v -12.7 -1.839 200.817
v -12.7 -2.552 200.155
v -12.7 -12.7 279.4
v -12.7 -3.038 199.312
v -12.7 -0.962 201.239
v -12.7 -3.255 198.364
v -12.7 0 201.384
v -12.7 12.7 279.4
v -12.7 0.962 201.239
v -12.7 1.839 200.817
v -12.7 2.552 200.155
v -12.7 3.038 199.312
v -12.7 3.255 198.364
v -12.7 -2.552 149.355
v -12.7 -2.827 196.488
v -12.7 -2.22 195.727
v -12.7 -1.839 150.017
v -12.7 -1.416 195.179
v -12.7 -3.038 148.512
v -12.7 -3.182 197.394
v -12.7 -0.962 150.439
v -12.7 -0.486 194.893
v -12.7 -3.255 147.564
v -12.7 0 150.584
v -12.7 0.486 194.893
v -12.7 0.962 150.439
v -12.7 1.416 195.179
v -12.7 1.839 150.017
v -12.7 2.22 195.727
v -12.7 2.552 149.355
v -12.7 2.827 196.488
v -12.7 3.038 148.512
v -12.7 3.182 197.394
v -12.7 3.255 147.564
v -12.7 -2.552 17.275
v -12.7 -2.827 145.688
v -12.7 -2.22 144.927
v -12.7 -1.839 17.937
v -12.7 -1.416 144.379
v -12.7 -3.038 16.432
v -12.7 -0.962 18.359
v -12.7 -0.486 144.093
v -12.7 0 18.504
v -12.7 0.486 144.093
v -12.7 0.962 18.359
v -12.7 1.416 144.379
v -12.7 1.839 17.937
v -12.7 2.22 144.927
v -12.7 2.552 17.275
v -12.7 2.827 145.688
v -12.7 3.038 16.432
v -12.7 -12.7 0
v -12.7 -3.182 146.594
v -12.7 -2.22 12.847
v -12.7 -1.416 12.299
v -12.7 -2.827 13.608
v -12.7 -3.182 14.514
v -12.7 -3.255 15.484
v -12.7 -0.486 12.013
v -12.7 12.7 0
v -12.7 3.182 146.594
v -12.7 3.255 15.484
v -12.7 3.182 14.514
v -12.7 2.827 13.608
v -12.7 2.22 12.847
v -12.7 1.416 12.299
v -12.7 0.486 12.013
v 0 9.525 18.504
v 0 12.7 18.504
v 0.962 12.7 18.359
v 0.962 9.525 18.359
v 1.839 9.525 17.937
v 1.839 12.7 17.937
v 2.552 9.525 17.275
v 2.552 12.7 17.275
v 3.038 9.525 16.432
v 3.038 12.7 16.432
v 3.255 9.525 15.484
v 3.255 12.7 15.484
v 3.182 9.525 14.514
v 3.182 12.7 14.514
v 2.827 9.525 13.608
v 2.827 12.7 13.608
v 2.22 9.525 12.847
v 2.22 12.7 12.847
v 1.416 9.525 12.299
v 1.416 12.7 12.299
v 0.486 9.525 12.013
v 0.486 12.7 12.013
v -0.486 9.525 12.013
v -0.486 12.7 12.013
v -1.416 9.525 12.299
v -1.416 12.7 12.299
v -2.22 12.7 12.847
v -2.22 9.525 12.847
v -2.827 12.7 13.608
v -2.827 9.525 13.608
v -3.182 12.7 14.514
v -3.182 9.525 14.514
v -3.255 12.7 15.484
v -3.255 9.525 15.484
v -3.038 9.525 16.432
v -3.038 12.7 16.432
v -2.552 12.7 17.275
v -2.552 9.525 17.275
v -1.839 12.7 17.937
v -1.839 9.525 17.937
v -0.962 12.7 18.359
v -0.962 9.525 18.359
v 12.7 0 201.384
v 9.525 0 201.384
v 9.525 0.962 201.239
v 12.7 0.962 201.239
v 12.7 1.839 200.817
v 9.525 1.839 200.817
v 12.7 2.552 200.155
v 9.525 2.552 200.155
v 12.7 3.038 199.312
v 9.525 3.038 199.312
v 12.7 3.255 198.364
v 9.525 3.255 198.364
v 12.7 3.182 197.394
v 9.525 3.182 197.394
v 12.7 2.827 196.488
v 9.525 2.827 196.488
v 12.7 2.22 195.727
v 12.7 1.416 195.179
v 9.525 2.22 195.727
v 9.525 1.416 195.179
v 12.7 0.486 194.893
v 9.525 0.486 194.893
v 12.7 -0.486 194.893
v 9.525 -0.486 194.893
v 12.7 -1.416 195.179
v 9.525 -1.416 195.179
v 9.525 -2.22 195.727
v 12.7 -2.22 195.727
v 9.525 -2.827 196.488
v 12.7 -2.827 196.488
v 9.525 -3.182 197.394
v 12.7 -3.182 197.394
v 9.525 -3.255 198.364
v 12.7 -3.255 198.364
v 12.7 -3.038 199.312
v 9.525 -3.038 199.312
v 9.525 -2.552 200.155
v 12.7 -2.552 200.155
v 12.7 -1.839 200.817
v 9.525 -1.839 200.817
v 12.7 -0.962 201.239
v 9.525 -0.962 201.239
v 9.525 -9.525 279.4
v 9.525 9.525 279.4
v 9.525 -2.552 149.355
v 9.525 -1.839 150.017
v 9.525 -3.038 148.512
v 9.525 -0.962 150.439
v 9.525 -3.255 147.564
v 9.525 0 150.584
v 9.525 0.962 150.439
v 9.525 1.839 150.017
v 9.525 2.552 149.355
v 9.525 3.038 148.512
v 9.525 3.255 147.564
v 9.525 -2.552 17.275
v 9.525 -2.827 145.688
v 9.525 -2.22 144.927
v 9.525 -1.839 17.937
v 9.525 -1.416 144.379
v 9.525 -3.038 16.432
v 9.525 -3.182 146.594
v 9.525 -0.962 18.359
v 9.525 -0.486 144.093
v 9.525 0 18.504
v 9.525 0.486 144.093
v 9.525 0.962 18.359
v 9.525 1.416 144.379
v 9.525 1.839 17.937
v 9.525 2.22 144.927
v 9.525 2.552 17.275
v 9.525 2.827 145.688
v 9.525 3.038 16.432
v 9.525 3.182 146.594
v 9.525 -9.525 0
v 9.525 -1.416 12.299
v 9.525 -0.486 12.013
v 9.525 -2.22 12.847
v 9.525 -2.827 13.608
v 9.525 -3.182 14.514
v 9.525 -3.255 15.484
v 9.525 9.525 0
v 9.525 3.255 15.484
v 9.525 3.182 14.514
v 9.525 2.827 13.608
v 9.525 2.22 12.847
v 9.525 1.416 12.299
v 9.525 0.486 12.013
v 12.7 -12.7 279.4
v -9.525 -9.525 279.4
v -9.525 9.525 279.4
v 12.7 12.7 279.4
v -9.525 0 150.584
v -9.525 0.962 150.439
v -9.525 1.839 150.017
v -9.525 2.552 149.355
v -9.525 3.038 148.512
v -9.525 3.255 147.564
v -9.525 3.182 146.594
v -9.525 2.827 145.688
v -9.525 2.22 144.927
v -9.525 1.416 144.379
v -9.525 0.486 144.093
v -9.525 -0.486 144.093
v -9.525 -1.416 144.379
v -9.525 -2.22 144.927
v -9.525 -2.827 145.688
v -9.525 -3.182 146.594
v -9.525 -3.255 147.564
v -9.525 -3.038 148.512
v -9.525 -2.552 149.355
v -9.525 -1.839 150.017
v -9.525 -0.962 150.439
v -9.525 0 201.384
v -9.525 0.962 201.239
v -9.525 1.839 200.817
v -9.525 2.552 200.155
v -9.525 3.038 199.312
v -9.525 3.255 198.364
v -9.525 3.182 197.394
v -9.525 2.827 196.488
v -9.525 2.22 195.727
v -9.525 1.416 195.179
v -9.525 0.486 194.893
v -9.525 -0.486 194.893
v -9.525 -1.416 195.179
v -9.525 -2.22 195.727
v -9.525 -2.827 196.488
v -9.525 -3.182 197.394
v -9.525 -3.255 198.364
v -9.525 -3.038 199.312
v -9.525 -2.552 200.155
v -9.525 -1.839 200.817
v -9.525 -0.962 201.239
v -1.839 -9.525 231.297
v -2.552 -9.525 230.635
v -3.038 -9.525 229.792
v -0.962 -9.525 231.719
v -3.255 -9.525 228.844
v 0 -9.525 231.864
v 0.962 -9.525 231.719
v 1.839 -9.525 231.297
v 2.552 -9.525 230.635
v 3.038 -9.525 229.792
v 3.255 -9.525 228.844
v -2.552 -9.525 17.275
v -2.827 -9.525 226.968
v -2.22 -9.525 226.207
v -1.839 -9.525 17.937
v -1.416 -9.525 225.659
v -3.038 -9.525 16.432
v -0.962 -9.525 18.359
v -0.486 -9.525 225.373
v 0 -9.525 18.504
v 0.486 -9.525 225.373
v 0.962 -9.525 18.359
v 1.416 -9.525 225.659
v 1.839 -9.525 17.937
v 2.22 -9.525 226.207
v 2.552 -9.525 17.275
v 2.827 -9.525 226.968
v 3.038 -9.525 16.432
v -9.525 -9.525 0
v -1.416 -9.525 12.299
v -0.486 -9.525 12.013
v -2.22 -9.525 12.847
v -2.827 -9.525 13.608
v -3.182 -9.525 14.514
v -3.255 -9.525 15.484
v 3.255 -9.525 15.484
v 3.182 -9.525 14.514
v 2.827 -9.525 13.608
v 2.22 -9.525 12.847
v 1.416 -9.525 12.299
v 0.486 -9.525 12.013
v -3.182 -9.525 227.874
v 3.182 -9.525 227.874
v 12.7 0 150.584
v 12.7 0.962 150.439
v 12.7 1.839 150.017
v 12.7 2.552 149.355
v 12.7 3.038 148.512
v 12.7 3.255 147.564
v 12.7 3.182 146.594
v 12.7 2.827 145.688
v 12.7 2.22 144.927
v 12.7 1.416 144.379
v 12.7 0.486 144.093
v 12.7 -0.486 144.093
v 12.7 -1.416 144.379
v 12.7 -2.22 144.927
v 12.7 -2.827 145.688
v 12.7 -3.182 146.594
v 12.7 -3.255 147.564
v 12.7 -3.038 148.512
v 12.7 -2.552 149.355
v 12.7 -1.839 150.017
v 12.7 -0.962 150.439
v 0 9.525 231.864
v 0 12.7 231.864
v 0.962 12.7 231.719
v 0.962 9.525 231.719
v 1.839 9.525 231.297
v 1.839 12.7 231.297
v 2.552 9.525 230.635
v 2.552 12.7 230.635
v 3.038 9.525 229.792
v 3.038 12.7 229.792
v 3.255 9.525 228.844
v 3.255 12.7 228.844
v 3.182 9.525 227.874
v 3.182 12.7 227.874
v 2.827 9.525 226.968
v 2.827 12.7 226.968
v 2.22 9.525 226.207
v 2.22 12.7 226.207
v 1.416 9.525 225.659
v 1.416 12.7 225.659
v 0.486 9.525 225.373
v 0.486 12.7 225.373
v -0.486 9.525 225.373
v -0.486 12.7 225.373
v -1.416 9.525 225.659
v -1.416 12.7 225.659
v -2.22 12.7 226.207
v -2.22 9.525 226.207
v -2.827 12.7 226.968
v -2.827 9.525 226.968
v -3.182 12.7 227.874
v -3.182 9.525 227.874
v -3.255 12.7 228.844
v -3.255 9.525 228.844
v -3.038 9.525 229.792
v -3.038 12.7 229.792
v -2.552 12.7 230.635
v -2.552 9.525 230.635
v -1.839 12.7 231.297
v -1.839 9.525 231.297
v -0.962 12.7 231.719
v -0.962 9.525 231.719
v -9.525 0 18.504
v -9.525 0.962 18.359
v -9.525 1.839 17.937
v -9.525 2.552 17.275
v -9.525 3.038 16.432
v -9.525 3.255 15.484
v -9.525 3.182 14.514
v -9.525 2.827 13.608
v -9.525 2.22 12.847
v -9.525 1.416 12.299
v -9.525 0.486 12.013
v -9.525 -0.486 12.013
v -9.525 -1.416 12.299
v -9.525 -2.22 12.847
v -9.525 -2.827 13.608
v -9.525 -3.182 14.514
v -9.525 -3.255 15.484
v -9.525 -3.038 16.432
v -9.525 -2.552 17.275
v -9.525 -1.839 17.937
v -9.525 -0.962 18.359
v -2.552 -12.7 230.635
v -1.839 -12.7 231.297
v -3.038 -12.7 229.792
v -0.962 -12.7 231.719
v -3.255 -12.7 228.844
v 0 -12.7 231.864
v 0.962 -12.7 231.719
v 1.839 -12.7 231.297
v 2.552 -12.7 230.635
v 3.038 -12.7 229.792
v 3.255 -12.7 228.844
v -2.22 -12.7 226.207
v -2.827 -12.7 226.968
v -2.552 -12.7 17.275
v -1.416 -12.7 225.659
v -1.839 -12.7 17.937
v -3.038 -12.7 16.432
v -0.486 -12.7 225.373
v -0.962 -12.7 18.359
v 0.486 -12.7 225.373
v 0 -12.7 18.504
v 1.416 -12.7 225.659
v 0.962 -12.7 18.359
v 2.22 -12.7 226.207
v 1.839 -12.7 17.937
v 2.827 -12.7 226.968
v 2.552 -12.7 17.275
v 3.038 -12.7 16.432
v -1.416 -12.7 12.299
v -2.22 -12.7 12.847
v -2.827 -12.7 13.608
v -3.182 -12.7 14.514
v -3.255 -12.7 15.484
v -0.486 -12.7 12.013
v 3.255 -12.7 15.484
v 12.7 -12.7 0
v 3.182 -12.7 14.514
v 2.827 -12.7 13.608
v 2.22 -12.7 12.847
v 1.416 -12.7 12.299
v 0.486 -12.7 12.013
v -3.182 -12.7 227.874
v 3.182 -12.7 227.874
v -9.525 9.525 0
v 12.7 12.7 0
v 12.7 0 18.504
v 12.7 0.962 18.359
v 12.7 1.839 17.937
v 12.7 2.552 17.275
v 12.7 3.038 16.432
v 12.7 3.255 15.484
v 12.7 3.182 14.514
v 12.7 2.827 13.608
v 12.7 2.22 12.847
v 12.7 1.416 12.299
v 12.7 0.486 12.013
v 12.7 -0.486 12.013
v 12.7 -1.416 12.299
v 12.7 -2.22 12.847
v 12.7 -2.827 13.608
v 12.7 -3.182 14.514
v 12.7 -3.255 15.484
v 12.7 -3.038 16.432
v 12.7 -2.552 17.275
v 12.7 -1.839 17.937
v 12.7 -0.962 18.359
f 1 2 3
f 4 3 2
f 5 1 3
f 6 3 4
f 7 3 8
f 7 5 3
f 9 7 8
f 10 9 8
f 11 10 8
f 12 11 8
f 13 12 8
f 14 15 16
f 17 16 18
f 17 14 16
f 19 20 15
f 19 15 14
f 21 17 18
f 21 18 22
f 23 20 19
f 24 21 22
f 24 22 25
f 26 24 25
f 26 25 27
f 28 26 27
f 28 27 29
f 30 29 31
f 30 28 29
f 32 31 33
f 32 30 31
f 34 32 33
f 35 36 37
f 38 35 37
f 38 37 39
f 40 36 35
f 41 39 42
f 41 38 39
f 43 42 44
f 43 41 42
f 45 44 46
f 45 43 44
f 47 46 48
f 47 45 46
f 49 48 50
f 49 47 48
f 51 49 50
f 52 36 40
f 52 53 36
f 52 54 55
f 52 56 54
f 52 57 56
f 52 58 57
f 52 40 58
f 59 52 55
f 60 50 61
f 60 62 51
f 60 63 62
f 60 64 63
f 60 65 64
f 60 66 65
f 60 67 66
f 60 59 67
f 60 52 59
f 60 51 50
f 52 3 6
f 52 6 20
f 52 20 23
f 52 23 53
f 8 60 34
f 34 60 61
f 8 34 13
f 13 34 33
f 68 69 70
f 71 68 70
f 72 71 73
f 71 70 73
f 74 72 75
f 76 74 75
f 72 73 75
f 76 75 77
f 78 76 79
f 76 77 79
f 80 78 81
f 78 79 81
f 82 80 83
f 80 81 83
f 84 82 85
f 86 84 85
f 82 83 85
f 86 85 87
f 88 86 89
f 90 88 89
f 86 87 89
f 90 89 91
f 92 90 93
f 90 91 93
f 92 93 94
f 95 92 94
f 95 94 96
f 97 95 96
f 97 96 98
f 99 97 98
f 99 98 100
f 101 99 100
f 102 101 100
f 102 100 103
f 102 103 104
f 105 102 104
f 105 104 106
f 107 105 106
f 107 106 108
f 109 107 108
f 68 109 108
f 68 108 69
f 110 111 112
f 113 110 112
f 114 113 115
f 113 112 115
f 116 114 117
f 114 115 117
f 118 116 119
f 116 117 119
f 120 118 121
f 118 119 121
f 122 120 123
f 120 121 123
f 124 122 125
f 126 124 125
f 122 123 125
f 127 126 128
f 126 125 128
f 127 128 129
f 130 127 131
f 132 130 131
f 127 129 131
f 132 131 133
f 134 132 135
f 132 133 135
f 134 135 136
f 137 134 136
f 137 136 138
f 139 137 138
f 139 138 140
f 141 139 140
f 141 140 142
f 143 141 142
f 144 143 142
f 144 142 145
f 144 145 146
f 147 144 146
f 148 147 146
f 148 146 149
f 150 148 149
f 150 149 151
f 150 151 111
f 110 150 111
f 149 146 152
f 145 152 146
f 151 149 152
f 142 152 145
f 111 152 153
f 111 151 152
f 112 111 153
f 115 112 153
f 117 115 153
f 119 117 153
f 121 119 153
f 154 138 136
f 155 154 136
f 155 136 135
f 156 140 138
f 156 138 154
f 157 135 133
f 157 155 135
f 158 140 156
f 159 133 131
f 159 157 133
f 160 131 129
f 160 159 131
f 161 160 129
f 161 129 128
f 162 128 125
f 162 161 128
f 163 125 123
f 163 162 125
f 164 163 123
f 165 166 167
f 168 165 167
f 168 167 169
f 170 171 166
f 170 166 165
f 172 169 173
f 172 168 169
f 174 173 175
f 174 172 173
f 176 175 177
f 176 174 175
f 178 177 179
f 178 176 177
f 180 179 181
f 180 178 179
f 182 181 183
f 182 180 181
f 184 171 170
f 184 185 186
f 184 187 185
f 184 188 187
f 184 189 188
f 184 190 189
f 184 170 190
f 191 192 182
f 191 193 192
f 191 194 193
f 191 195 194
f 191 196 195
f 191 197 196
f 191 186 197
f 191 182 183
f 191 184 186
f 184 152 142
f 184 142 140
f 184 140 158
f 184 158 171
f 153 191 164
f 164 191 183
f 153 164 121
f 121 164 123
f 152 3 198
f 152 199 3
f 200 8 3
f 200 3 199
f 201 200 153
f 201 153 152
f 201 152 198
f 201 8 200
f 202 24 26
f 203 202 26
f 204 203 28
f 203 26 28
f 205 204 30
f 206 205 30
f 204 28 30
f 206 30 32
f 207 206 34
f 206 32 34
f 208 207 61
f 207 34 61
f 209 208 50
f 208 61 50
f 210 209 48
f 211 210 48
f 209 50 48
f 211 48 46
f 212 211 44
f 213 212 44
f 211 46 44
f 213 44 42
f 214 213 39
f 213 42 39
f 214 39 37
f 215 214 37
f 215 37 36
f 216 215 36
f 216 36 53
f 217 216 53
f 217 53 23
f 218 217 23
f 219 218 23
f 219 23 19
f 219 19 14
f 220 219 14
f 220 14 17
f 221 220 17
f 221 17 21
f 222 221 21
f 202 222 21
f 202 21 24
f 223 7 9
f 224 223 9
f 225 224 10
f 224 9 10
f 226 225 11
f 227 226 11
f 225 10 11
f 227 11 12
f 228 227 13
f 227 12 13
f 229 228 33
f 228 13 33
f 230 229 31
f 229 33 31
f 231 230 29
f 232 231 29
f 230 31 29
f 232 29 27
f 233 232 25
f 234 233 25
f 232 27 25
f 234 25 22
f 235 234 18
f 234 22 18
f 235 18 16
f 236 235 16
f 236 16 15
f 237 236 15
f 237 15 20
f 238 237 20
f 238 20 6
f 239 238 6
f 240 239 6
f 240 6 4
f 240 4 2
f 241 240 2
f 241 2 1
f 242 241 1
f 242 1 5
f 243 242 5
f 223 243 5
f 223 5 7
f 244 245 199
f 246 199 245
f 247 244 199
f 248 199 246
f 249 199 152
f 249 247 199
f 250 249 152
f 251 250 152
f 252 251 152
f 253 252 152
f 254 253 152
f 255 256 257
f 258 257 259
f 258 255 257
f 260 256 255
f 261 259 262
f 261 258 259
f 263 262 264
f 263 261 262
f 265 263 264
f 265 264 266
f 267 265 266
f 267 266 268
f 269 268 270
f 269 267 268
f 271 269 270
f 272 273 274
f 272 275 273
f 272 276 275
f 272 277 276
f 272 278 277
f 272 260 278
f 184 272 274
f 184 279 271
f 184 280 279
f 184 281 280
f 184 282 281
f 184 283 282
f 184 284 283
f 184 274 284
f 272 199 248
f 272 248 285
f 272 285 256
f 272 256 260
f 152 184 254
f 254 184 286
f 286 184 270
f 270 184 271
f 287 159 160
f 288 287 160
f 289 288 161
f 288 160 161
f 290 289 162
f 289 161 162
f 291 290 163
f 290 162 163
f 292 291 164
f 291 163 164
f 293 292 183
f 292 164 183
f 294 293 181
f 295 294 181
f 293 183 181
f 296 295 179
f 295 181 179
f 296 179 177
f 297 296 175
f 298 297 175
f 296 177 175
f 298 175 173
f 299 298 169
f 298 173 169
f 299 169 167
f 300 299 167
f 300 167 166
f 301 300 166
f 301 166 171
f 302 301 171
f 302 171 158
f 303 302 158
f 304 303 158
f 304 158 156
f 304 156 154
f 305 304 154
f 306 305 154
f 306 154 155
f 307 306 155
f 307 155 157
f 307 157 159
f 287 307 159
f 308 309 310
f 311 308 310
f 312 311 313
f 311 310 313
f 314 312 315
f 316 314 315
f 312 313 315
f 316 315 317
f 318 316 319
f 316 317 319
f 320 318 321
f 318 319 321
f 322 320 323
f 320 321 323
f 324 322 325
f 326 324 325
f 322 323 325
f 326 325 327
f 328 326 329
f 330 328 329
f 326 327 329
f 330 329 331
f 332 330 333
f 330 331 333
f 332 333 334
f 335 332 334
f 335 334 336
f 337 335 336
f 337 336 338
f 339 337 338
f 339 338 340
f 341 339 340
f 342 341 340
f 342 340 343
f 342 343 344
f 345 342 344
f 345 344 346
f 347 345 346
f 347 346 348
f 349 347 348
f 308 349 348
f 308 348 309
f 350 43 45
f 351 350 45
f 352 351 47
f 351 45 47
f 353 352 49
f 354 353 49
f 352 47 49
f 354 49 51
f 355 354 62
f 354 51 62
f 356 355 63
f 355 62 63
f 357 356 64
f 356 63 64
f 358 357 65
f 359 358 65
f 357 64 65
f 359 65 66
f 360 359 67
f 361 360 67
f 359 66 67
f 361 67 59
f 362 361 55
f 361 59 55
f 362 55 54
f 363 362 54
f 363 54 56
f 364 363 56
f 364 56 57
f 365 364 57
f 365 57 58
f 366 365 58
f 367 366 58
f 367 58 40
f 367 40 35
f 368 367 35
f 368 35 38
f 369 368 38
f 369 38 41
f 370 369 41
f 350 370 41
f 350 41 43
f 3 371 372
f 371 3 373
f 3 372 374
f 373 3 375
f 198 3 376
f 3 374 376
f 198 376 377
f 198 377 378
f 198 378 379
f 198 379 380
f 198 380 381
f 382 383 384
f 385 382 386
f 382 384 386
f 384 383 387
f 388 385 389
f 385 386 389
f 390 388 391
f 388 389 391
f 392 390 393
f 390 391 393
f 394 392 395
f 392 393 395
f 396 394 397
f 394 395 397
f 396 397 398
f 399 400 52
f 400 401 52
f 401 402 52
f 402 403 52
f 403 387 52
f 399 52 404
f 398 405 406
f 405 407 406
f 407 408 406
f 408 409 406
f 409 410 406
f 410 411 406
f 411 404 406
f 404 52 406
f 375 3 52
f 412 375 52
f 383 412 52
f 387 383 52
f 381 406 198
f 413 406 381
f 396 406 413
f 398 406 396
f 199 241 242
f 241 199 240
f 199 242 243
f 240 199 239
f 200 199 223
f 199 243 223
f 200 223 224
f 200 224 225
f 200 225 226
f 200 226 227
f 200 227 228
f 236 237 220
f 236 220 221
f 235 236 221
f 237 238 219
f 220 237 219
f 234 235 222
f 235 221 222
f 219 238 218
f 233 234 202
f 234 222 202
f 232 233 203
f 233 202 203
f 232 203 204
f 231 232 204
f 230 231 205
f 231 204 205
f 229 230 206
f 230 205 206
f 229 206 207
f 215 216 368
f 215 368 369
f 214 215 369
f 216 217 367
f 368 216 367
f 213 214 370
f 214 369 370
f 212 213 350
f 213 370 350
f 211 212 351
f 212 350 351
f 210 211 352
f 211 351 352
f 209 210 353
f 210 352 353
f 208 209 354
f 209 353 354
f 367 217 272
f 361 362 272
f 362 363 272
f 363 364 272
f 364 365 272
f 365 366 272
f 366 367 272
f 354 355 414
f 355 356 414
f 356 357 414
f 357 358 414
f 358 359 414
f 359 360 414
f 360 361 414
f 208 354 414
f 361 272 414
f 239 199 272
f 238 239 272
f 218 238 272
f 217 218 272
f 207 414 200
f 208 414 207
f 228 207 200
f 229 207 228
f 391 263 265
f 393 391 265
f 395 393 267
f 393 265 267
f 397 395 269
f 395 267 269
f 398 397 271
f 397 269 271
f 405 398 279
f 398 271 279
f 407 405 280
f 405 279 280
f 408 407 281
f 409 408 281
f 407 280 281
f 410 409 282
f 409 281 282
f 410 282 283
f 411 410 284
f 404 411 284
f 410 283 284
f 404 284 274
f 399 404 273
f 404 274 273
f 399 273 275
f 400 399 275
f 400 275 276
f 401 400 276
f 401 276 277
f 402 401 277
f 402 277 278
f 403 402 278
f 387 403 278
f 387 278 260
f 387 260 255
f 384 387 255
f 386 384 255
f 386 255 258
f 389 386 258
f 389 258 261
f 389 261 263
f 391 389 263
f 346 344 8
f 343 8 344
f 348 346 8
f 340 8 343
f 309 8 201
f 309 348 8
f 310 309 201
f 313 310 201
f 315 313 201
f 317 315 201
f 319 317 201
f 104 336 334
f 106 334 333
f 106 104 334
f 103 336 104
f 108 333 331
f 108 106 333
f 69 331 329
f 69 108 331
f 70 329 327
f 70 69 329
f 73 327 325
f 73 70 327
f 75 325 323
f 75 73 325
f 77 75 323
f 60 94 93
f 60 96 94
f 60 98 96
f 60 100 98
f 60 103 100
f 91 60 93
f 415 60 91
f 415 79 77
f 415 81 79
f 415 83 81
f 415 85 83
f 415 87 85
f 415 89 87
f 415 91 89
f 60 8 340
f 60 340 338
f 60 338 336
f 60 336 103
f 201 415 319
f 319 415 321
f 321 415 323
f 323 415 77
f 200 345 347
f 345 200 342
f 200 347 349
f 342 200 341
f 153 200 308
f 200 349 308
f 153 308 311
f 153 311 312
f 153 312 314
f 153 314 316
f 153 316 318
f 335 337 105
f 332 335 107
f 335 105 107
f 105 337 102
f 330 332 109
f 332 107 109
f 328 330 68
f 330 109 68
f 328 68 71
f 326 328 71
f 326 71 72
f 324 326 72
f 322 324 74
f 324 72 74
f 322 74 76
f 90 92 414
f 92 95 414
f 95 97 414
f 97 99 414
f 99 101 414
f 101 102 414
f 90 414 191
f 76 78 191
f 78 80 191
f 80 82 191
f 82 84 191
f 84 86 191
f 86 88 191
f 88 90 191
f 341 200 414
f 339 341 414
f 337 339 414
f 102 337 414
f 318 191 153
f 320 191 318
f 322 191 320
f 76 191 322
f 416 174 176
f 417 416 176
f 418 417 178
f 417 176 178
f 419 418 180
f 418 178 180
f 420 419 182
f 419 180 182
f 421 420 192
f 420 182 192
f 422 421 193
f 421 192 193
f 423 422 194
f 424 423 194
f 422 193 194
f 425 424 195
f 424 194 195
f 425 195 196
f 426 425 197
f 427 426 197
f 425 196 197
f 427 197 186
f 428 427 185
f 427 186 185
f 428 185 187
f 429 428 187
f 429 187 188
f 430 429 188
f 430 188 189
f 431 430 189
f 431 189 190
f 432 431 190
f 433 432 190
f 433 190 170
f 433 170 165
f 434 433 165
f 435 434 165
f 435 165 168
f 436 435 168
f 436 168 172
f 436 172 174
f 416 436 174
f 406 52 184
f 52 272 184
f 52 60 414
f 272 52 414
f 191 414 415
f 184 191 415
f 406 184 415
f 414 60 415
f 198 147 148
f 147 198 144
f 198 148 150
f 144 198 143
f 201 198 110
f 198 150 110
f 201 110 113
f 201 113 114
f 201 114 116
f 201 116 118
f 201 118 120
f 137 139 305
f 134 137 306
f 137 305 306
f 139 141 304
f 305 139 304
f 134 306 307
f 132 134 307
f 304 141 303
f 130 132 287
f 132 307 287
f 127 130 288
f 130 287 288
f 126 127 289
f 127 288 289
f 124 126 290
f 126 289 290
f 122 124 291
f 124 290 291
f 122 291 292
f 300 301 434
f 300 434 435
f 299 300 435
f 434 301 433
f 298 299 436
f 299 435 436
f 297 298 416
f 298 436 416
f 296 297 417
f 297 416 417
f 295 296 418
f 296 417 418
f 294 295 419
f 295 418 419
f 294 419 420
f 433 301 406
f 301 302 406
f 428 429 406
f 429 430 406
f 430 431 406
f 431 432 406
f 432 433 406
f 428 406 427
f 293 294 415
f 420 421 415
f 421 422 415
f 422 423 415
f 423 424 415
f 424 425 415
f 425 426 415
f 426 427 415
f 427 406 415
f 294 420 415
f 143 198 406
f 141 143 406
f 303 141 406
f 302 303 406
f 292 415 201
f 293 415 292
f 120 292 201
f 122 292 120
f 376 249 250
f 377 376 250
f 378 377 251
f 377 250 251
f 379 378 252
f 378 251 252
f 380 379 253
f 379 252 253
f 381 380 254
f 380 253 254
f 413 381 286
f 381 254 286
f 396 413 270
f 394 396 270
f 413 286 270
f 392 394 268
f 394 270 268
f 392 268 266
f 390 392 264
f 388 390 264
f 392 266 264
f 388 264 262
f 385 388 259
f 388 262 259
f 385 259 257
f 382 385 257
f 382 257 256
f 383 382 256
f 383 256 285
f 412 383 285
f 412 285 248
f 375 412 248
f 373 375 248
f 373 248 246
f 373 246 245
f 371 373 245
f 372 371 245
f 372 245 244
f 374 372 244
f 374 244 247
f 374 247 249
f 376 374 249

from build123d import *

# Parameters (mm, degrees)
SKETCH2_W           = 25.4
SKETCH2_H           = 25.4
BOSS_EXTRUDE1_DEPTH = 279.4
SKETCH4_W           = 19.05
SKETCH4_H           = 19.05
CUT_EXTRUDE1_DEPTH  = 280.9766776
SKETCH5_R           = 3.2639
CUT_EXTRUDE2_DEPTH  = 281.839473721
SKETCH6_R           = 3.2639
CUT_EXTRUDE3_DEPTH  = 281.839473721
SKETCH7_R           = 3.2639
CUT_EXTRUDE4_DEPTH  = 281.839473721
SKETCH8_R           = 3.2639
CUT_EXTRUDE5_DEPTH  = 281.839473721


with BuildPart() as part:
    # Sketch2 → Boss-Extrude1 (new body)
    with BuildSketch(Plane.XY):
        Rectangle(SKETCH2_W, SKETCH2_H)
    extrude(amount=BOSS_EXTRUDE1_DEPTH)

    # Sketch4 → Cut-Extrude1 (cut, through all)
    with BuildSketch(Plane.XY):
        Rectangle(SKETCH4_W, SKETCH4_H)
    extrude(amount=CUT_EXTRUDE1_DEPTH, mode=Mode.SUBTRACT)

    # Sketch5 → Cut-Extrude2 (cut, through all)
    with BuildSketch(Plane(origin=(0, 12.7, 0), x_dir=(1, 0, 0), z_dir=(0, 1, 0))):
        with Locations(Location((0, -15.24, 0), (0, 0, 270))):
            Circle(SKETCH5_R)
    extrude(amount=-CUT_EXTRUDE2_DEPTH, mode=Mode.SUBTRACT)

    # Sketch6 → Cut-Extrude3 (cut, through all)
    with BuildSketch(Plane(origin=(0, 12.7, 0), x_dir=(1, 0, 0), z_dir=(0, 1, 0))):
        with Locations(Location((0, -228.6, 0), (0, 0, 270))):
            Circle(SKETCH6_R)
    extrude(amount=-CUT_EXTRUDE3_DEPTH, mode=Mode.SUBTRACT)

    # Sketch7 → Cut-Extrude4 (cut, through all)
    with BuildSketch(Plane.ZY.offset(12.7)):
        with Locations((15.24, 0)):
            Circle(SKETCH7_R)
    extrude(amount=-CUT_EXTRUDE4_DEPTH, mode=Mode.SUBTRACT)

    # Sketch8 → Cut-Extrude5 (cut, through all)
    with BuildSketch(Plane.ZY.offset(12.7)):
        with Locations((198.12, 0)):
            Circle(SKETCH8_R)
        with Locations((147.32, 0)):
            Circle(SKETCH8_R)
    extrude(amount=-CUT_EXTRUDE5_DEPTH, mode=Mode.SUBTRACT)


solid = part.part
